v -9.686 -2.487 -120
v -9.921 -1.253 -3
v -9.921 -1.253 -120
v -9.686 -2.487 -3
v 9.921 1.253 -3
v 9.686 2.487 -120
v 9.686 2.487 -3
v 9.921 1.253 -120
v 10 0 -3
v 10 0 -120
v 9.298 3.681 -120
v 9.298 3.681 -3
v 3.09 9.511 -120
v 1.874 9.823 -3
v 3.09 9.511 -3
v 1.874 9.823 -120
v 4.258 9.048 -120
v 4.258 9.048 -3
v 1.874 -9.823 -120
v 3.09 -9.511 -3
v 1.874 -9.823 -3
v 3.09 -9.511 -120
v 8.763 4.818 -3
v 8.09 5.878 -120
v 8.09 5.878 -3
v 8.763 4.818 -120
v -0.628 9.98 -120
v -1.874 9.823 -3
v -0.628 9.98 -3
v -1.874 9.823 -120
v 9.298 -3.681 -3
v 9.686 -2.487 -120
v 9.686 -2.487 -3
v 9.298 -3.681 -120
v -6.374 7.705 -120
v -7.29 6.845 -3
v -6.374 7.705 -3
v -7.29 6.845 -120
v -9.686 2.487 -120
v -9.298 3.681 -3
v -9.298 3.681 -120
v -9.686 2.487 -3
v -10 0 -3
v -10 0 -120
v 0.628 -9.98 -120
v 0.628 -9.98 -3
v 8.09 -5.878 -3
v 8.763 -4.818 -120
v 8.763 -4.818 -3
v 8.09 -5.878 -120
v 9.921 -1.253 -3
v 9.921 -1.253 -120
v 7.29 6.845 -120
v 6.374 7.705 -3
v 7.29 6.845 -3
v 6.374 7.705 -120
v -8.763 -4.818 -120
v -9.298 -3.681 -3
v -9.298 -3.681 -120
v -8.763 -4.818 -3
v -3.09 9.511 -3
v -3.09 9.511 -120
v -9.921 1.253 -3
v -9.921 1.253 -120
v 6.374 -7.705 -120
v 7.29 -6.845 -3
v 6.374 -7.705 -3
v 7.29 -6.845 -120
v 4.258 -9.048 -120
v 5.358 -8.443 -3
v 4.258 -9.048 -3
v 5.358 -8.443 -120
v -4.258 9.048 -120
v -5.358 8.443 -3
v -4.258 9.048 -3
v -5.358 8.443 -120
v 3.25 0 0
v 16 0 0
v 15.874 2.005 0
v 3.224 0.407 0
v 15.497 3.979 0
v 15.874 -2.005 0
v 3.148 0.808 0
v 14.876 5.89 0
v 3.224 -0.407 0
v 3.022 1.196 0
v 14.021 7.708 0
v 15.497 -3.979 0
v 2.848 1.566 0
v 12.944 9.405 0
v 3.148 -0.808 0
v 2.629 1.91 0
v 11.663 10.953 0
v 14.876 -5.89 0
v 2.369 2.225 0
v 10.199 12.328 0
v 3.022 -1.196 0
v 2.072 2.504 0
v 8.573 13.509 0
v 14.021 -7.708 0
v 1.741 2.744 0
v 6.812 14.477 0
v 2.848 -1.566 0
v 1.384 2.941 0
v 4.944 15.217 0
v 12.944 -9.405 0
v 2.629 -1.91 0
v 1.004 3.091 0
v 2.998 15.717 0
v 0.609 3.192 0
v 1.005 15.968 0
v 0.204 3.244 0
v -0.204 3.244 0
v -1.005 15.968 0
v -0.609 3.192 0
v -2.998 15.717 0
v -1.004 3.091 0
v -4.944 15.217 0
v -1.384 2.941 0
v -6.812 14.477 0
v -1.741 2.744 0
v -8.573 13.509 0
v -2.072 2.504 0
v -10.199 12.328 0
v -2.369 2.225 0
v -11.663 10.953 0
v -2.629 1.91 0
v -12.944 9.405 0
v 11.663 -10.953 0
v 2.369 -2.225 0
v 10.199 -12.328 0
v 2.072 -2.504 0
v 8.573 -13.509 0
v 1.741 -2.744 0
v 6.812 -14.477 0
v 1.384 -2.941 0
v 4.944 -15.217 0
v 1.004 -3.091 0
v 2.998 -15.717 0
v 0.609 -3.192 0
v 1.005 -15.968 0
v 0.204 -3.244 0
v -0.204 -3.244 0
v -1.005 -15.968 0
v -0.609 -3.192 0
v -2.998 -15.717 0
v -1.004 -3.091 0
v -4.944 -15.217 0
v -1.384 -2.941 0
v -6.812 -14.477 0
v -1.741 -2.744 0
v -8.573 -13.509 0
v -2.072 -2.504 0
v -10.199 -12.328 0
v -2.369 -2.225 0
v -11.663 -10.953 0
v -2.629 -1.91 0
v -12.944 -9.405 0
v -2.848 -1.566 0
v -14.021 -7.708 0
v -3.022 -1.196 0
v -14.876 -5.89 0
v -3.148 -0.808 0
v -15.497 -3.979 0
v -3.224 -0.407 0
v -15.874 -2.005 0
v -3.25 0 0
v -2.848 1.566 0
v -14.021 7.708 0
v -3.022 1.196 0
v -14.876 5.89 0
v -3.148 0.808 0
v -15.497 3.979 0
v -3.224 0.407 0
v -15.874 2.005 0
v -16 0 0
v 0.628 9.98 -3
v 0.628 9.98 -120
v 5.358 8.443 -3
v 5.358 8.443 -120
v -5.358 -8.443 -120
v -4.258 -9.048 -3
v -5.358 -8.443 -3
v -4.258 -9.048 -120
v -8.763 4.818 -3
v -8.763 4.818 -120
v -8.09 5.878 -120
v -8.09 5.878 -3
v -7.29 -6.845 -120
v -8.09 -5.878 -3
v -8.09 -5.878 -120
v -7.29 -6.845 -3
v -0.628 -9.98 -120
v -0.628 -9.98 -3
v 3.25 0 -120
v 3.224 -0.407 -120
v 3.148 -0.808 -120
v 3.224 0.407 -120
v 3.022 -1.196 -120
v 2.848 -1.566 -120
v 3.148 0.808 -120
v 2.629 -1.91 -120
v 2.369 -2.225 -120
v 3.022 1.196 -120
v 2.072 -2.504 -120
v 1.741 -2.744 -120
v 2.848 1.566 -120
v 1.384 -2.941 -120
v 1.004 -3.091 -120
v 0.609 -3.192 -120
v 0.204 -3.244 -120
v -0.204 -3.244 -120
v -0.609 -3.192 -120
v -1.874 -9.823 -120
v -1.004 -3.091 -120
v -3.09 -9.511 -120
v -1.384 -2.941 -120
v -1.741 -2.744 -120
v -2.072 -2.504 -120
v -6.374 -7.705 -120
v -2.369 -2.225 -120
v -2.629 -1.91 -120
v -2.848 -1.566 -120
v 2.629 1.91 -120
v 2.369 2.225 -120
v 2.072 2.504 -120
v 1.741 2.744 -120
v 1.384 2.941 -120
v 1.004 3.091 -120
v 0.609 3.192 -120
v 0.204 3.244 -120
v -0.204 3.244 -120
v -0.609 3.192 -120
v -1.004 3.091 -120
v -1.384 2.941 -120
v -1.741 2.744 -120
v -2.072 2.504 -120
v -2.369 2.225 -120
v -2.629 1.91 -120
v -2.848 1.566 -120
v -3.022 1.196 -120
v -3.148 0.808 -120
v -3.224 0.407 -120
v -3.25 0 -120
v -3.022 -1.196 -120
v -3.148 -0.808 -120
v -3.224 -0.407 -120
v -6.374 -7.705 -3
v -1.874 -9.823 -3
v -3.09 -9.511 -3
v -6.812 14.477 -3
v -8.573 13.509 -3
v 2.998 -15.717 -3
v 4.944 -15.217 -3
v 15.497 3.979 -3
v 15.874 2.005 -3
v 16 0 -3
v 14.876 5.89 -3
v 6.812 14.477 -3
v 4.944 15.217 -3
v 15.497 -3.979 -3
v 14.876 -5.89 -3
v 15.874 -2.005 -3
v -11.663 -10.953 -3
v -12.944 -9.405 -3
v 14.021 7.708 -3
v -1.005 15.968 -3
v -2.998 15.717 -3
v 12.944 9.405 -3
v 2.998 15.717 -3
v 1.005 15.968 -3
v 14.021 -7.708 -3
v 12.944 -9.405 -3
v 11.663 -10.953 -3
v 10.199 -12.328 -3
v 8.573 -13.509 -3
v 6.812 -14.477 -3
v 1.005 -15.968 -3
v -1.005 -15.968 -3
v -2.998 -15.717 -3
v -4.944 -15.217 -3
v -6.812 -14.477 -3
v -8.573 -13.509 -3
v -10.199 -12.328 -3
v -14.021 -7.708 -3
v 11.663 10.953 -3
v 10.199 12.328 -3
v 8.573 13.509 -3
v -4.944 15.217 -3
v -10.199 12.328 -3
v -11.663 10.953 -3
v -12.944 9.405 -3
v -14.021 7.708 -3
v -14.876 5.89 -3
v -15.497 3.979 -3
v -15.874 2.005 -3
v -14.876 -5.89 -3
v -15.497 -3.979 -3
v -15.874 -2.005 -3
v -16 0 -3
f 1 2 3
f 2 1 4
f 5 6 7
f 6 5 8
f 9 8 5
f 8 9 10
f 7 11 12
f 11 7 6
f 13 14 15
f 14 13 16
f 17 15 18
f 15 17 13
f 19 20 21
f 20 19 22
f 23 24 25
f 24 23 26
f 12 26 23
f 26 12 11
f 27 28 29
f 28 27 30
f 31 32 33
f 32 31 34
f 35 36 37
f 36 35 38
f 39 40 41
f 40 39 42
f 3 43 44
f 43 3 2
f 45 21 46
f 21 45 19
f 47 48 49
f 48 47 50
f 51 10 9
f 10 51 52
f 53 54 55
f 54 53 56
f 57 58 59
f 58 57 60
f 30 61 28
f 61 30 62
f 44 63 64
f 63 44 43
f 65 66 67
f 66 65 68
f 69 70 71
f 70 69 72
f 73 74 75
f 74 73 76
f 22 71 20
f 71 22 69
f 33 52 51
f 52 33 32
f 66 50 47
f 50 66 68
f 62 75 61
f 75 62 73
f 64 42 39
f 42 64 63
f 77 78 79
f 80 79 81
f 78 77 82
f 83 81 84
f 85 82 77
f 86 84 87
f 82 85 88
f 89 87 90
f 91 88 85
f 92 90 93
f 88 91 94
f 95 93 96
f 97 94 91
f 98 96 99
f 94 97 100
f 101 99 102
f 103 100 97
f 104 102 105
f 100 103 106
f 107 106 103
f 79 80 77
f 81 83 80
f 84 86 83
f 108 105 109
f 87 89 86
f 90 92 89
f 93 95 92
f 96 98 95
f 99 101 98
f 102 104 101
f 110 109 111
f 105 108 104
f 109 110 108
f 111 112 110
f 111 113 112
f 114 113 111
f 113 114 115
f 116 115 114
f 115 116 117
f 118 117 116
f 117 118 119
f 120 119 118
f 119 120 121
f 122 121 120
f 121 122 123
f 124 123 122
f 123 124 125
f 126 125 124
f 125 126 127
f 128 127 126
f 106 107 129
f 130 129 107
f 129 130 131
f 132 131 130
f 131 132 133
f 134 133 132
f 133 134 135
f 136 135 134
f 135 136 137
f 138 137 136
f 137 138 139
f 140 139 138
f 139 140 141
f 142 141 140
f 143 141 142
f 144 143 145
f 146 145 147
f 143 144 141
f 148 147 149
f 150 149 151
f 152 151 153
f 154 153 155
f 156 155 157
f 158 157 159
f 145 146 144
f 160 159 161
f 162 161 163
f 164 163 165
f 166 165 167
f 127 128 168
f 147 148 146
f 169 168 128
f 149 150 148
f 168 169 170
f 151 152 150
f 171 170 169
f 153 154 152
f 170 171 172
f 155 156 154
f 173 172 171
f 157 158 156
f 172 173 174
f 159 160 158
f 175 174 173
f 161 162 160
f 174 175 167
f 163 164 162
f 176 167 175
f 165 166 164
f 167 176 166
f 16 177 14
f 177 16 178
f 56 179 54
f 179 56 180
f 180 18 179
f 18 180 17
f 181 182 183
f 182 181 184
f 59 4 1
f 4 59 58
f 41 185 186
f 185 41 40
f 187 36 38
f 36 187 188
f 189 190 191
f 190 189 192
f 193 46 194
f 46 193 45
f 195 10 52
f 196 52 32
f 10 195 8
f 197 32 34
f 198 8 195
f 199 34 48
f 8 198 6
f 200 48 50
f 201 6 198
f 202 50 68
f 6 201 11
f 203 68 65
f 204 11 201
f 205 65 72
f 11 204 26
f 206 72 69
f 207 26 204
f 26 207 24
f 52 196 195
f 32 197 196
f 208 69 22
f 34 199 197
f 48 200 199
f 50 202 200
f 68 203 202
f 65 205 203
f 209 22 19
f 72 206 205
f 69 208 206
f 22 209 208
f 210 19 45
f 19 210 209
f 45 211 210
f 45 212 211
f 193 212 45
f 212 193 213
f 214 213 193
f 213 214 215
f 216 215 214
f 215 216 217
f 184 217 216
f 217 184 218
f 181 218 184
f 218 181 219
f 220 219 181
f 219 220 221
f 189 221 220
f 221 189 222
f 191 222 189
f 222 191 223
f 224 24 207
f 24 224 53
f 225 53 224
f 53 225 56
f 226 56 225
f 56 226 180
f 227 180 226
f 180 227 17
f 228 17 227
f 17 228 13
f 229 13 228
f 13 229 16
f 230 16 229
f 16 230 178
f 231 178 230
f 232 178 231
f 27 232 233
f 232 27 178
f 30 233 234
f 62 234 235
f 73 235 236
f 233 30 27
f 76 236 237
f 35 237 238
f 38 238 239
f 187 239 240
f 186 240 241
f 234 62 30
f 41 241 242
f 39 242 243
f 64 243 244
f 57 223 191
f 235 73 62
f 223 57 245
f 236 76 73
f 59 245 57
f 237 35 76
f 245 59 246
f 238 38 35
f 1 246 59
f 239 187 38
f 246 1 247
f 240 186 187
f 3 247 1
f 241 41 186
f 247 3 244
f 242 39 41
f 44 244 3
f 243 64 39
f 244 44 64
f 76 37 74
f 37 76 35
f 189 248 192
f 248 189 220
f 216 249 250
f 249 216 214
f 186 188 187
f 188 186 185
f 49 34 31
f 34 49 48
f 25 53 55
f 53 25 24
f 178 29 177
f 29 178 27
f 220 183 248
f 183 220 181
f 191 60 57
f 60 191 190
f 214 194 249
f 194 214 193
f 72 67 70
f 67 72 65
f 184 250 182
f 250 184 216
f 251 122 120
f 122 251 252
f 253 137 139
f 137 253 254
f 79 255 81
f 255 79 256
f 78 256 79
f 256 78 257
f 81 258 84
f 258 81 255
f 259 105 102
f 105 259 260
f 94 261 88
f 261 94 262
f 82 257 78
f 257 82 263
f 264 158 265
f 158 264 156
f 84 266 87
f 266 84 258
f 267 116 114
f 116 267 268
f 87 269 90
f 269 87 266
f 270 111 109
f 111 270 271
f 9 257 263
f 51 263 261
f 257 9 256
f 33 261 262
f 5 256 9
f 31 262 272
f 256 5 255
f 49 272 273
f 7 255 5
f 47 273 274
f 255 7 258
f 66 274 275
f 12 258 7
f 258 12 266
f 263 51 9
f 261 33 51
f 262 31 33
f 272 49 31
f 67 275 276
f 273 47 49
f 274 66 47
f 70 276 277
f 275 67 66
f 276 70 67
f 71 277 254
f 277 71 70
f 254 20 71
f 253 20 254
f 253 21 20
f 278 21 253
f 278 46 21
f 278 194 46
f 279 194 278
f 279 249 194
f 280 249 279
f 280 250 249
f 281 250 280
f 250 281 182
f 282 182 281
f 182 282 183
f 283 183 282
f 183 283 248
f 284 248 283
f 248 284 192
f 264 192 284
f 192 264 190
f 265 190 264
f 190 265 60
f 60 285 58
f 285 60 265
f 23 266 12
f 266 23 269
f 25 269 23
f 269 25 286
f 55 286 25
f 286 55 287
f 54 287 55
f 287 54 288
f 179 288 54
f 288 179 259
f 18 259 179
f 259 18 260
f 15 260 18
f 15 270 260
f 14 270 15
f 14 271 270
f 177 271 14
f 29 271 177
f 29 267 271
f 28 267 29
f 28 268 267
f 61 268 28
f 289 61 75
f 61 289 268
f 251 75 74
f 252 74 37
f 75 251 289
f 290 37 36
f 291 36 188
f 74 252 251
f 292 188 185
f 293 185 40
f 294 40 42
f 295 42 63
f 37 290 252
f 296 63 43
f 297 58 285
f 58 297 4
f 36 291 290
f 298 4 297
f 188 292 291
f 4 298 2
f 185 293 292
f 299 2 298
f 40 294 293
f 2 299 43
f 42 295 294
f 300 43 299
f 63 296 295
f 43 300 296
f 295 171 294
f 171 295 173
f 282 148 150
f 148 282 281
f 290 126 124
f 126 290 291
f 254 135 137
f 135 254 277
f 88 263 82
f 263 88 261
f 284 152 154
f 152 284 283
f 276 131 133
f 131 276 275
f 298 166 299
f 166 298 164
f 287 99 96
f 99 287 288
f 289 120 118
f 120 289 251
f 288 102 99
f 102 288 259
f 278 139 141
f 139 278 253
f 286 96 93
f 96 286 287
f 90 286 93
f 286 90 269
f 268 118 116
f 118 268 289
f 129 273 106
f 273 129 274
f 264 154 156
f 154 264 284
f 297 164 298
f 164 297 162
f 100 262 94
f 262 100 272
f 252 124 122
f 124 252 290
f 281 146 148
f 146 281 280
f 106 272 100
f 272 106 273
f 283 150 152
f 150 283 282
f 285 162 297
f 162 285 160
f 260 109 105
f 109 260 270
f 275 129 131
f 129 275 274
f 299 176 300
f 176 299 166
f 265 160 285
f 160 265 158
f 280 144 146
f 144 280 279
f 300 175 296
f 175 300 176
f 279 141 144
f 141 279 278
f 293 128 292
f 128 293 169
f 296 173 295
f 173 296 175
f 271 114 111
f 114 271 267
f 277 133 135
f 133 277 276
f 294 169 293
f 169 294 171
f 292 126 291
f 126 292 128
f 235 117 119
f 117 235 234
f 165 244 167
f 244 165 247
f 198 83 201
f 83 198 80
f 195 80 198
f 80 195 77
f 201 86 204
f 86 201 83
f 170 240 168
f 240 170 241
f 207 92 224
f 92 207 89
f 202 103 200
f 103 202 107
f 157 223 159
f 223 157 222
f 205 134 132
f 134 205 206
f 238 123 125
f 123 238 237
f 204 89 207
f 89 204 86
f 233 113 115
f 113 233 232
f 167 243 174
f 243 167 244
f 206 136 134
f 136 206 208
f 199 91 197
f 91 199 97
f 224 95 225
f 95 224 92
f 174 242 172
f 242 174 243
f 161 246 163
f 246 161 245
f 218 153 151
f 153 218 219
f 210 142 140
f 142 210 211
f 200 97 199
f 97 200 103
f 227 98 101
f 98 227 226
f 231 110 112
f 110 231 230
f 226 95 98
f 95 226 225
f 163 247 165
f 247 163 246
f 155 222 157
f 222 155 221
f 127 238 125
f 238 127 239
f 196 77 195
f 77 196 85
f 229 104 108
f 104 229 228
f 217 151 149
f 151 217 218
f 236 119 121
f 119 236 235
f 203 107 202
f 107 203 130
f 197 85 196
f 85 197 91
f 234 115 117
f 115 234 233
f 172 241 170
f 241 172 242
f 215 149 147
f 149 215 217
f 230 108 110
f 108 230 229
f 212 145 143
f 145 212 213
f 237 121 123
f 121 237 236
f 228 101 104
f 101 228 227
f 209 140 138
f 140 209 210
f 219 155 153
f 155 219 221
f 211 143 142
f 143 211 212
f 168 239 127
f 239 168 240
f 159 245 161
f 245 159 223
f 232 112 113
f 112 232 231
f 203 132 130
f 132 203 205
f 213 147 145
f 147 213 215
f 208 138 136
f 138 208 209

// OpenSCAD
$fn = 50;


difference() {
	union() {
		translate(v = [0, 0, -120.0000000000]) {
			cylinder(h = 120, r = 10.0000000000);
		}
		translate(v = [0, 0, -3.0000000000]) {
			cylinder(h = 3, r = 16.0000000000);
		}
	}
	union() {
		#translate(v = [0, 0, -120]) {
			cylinder(h = 120, r = 3.2500000000);
		}
	}
}
